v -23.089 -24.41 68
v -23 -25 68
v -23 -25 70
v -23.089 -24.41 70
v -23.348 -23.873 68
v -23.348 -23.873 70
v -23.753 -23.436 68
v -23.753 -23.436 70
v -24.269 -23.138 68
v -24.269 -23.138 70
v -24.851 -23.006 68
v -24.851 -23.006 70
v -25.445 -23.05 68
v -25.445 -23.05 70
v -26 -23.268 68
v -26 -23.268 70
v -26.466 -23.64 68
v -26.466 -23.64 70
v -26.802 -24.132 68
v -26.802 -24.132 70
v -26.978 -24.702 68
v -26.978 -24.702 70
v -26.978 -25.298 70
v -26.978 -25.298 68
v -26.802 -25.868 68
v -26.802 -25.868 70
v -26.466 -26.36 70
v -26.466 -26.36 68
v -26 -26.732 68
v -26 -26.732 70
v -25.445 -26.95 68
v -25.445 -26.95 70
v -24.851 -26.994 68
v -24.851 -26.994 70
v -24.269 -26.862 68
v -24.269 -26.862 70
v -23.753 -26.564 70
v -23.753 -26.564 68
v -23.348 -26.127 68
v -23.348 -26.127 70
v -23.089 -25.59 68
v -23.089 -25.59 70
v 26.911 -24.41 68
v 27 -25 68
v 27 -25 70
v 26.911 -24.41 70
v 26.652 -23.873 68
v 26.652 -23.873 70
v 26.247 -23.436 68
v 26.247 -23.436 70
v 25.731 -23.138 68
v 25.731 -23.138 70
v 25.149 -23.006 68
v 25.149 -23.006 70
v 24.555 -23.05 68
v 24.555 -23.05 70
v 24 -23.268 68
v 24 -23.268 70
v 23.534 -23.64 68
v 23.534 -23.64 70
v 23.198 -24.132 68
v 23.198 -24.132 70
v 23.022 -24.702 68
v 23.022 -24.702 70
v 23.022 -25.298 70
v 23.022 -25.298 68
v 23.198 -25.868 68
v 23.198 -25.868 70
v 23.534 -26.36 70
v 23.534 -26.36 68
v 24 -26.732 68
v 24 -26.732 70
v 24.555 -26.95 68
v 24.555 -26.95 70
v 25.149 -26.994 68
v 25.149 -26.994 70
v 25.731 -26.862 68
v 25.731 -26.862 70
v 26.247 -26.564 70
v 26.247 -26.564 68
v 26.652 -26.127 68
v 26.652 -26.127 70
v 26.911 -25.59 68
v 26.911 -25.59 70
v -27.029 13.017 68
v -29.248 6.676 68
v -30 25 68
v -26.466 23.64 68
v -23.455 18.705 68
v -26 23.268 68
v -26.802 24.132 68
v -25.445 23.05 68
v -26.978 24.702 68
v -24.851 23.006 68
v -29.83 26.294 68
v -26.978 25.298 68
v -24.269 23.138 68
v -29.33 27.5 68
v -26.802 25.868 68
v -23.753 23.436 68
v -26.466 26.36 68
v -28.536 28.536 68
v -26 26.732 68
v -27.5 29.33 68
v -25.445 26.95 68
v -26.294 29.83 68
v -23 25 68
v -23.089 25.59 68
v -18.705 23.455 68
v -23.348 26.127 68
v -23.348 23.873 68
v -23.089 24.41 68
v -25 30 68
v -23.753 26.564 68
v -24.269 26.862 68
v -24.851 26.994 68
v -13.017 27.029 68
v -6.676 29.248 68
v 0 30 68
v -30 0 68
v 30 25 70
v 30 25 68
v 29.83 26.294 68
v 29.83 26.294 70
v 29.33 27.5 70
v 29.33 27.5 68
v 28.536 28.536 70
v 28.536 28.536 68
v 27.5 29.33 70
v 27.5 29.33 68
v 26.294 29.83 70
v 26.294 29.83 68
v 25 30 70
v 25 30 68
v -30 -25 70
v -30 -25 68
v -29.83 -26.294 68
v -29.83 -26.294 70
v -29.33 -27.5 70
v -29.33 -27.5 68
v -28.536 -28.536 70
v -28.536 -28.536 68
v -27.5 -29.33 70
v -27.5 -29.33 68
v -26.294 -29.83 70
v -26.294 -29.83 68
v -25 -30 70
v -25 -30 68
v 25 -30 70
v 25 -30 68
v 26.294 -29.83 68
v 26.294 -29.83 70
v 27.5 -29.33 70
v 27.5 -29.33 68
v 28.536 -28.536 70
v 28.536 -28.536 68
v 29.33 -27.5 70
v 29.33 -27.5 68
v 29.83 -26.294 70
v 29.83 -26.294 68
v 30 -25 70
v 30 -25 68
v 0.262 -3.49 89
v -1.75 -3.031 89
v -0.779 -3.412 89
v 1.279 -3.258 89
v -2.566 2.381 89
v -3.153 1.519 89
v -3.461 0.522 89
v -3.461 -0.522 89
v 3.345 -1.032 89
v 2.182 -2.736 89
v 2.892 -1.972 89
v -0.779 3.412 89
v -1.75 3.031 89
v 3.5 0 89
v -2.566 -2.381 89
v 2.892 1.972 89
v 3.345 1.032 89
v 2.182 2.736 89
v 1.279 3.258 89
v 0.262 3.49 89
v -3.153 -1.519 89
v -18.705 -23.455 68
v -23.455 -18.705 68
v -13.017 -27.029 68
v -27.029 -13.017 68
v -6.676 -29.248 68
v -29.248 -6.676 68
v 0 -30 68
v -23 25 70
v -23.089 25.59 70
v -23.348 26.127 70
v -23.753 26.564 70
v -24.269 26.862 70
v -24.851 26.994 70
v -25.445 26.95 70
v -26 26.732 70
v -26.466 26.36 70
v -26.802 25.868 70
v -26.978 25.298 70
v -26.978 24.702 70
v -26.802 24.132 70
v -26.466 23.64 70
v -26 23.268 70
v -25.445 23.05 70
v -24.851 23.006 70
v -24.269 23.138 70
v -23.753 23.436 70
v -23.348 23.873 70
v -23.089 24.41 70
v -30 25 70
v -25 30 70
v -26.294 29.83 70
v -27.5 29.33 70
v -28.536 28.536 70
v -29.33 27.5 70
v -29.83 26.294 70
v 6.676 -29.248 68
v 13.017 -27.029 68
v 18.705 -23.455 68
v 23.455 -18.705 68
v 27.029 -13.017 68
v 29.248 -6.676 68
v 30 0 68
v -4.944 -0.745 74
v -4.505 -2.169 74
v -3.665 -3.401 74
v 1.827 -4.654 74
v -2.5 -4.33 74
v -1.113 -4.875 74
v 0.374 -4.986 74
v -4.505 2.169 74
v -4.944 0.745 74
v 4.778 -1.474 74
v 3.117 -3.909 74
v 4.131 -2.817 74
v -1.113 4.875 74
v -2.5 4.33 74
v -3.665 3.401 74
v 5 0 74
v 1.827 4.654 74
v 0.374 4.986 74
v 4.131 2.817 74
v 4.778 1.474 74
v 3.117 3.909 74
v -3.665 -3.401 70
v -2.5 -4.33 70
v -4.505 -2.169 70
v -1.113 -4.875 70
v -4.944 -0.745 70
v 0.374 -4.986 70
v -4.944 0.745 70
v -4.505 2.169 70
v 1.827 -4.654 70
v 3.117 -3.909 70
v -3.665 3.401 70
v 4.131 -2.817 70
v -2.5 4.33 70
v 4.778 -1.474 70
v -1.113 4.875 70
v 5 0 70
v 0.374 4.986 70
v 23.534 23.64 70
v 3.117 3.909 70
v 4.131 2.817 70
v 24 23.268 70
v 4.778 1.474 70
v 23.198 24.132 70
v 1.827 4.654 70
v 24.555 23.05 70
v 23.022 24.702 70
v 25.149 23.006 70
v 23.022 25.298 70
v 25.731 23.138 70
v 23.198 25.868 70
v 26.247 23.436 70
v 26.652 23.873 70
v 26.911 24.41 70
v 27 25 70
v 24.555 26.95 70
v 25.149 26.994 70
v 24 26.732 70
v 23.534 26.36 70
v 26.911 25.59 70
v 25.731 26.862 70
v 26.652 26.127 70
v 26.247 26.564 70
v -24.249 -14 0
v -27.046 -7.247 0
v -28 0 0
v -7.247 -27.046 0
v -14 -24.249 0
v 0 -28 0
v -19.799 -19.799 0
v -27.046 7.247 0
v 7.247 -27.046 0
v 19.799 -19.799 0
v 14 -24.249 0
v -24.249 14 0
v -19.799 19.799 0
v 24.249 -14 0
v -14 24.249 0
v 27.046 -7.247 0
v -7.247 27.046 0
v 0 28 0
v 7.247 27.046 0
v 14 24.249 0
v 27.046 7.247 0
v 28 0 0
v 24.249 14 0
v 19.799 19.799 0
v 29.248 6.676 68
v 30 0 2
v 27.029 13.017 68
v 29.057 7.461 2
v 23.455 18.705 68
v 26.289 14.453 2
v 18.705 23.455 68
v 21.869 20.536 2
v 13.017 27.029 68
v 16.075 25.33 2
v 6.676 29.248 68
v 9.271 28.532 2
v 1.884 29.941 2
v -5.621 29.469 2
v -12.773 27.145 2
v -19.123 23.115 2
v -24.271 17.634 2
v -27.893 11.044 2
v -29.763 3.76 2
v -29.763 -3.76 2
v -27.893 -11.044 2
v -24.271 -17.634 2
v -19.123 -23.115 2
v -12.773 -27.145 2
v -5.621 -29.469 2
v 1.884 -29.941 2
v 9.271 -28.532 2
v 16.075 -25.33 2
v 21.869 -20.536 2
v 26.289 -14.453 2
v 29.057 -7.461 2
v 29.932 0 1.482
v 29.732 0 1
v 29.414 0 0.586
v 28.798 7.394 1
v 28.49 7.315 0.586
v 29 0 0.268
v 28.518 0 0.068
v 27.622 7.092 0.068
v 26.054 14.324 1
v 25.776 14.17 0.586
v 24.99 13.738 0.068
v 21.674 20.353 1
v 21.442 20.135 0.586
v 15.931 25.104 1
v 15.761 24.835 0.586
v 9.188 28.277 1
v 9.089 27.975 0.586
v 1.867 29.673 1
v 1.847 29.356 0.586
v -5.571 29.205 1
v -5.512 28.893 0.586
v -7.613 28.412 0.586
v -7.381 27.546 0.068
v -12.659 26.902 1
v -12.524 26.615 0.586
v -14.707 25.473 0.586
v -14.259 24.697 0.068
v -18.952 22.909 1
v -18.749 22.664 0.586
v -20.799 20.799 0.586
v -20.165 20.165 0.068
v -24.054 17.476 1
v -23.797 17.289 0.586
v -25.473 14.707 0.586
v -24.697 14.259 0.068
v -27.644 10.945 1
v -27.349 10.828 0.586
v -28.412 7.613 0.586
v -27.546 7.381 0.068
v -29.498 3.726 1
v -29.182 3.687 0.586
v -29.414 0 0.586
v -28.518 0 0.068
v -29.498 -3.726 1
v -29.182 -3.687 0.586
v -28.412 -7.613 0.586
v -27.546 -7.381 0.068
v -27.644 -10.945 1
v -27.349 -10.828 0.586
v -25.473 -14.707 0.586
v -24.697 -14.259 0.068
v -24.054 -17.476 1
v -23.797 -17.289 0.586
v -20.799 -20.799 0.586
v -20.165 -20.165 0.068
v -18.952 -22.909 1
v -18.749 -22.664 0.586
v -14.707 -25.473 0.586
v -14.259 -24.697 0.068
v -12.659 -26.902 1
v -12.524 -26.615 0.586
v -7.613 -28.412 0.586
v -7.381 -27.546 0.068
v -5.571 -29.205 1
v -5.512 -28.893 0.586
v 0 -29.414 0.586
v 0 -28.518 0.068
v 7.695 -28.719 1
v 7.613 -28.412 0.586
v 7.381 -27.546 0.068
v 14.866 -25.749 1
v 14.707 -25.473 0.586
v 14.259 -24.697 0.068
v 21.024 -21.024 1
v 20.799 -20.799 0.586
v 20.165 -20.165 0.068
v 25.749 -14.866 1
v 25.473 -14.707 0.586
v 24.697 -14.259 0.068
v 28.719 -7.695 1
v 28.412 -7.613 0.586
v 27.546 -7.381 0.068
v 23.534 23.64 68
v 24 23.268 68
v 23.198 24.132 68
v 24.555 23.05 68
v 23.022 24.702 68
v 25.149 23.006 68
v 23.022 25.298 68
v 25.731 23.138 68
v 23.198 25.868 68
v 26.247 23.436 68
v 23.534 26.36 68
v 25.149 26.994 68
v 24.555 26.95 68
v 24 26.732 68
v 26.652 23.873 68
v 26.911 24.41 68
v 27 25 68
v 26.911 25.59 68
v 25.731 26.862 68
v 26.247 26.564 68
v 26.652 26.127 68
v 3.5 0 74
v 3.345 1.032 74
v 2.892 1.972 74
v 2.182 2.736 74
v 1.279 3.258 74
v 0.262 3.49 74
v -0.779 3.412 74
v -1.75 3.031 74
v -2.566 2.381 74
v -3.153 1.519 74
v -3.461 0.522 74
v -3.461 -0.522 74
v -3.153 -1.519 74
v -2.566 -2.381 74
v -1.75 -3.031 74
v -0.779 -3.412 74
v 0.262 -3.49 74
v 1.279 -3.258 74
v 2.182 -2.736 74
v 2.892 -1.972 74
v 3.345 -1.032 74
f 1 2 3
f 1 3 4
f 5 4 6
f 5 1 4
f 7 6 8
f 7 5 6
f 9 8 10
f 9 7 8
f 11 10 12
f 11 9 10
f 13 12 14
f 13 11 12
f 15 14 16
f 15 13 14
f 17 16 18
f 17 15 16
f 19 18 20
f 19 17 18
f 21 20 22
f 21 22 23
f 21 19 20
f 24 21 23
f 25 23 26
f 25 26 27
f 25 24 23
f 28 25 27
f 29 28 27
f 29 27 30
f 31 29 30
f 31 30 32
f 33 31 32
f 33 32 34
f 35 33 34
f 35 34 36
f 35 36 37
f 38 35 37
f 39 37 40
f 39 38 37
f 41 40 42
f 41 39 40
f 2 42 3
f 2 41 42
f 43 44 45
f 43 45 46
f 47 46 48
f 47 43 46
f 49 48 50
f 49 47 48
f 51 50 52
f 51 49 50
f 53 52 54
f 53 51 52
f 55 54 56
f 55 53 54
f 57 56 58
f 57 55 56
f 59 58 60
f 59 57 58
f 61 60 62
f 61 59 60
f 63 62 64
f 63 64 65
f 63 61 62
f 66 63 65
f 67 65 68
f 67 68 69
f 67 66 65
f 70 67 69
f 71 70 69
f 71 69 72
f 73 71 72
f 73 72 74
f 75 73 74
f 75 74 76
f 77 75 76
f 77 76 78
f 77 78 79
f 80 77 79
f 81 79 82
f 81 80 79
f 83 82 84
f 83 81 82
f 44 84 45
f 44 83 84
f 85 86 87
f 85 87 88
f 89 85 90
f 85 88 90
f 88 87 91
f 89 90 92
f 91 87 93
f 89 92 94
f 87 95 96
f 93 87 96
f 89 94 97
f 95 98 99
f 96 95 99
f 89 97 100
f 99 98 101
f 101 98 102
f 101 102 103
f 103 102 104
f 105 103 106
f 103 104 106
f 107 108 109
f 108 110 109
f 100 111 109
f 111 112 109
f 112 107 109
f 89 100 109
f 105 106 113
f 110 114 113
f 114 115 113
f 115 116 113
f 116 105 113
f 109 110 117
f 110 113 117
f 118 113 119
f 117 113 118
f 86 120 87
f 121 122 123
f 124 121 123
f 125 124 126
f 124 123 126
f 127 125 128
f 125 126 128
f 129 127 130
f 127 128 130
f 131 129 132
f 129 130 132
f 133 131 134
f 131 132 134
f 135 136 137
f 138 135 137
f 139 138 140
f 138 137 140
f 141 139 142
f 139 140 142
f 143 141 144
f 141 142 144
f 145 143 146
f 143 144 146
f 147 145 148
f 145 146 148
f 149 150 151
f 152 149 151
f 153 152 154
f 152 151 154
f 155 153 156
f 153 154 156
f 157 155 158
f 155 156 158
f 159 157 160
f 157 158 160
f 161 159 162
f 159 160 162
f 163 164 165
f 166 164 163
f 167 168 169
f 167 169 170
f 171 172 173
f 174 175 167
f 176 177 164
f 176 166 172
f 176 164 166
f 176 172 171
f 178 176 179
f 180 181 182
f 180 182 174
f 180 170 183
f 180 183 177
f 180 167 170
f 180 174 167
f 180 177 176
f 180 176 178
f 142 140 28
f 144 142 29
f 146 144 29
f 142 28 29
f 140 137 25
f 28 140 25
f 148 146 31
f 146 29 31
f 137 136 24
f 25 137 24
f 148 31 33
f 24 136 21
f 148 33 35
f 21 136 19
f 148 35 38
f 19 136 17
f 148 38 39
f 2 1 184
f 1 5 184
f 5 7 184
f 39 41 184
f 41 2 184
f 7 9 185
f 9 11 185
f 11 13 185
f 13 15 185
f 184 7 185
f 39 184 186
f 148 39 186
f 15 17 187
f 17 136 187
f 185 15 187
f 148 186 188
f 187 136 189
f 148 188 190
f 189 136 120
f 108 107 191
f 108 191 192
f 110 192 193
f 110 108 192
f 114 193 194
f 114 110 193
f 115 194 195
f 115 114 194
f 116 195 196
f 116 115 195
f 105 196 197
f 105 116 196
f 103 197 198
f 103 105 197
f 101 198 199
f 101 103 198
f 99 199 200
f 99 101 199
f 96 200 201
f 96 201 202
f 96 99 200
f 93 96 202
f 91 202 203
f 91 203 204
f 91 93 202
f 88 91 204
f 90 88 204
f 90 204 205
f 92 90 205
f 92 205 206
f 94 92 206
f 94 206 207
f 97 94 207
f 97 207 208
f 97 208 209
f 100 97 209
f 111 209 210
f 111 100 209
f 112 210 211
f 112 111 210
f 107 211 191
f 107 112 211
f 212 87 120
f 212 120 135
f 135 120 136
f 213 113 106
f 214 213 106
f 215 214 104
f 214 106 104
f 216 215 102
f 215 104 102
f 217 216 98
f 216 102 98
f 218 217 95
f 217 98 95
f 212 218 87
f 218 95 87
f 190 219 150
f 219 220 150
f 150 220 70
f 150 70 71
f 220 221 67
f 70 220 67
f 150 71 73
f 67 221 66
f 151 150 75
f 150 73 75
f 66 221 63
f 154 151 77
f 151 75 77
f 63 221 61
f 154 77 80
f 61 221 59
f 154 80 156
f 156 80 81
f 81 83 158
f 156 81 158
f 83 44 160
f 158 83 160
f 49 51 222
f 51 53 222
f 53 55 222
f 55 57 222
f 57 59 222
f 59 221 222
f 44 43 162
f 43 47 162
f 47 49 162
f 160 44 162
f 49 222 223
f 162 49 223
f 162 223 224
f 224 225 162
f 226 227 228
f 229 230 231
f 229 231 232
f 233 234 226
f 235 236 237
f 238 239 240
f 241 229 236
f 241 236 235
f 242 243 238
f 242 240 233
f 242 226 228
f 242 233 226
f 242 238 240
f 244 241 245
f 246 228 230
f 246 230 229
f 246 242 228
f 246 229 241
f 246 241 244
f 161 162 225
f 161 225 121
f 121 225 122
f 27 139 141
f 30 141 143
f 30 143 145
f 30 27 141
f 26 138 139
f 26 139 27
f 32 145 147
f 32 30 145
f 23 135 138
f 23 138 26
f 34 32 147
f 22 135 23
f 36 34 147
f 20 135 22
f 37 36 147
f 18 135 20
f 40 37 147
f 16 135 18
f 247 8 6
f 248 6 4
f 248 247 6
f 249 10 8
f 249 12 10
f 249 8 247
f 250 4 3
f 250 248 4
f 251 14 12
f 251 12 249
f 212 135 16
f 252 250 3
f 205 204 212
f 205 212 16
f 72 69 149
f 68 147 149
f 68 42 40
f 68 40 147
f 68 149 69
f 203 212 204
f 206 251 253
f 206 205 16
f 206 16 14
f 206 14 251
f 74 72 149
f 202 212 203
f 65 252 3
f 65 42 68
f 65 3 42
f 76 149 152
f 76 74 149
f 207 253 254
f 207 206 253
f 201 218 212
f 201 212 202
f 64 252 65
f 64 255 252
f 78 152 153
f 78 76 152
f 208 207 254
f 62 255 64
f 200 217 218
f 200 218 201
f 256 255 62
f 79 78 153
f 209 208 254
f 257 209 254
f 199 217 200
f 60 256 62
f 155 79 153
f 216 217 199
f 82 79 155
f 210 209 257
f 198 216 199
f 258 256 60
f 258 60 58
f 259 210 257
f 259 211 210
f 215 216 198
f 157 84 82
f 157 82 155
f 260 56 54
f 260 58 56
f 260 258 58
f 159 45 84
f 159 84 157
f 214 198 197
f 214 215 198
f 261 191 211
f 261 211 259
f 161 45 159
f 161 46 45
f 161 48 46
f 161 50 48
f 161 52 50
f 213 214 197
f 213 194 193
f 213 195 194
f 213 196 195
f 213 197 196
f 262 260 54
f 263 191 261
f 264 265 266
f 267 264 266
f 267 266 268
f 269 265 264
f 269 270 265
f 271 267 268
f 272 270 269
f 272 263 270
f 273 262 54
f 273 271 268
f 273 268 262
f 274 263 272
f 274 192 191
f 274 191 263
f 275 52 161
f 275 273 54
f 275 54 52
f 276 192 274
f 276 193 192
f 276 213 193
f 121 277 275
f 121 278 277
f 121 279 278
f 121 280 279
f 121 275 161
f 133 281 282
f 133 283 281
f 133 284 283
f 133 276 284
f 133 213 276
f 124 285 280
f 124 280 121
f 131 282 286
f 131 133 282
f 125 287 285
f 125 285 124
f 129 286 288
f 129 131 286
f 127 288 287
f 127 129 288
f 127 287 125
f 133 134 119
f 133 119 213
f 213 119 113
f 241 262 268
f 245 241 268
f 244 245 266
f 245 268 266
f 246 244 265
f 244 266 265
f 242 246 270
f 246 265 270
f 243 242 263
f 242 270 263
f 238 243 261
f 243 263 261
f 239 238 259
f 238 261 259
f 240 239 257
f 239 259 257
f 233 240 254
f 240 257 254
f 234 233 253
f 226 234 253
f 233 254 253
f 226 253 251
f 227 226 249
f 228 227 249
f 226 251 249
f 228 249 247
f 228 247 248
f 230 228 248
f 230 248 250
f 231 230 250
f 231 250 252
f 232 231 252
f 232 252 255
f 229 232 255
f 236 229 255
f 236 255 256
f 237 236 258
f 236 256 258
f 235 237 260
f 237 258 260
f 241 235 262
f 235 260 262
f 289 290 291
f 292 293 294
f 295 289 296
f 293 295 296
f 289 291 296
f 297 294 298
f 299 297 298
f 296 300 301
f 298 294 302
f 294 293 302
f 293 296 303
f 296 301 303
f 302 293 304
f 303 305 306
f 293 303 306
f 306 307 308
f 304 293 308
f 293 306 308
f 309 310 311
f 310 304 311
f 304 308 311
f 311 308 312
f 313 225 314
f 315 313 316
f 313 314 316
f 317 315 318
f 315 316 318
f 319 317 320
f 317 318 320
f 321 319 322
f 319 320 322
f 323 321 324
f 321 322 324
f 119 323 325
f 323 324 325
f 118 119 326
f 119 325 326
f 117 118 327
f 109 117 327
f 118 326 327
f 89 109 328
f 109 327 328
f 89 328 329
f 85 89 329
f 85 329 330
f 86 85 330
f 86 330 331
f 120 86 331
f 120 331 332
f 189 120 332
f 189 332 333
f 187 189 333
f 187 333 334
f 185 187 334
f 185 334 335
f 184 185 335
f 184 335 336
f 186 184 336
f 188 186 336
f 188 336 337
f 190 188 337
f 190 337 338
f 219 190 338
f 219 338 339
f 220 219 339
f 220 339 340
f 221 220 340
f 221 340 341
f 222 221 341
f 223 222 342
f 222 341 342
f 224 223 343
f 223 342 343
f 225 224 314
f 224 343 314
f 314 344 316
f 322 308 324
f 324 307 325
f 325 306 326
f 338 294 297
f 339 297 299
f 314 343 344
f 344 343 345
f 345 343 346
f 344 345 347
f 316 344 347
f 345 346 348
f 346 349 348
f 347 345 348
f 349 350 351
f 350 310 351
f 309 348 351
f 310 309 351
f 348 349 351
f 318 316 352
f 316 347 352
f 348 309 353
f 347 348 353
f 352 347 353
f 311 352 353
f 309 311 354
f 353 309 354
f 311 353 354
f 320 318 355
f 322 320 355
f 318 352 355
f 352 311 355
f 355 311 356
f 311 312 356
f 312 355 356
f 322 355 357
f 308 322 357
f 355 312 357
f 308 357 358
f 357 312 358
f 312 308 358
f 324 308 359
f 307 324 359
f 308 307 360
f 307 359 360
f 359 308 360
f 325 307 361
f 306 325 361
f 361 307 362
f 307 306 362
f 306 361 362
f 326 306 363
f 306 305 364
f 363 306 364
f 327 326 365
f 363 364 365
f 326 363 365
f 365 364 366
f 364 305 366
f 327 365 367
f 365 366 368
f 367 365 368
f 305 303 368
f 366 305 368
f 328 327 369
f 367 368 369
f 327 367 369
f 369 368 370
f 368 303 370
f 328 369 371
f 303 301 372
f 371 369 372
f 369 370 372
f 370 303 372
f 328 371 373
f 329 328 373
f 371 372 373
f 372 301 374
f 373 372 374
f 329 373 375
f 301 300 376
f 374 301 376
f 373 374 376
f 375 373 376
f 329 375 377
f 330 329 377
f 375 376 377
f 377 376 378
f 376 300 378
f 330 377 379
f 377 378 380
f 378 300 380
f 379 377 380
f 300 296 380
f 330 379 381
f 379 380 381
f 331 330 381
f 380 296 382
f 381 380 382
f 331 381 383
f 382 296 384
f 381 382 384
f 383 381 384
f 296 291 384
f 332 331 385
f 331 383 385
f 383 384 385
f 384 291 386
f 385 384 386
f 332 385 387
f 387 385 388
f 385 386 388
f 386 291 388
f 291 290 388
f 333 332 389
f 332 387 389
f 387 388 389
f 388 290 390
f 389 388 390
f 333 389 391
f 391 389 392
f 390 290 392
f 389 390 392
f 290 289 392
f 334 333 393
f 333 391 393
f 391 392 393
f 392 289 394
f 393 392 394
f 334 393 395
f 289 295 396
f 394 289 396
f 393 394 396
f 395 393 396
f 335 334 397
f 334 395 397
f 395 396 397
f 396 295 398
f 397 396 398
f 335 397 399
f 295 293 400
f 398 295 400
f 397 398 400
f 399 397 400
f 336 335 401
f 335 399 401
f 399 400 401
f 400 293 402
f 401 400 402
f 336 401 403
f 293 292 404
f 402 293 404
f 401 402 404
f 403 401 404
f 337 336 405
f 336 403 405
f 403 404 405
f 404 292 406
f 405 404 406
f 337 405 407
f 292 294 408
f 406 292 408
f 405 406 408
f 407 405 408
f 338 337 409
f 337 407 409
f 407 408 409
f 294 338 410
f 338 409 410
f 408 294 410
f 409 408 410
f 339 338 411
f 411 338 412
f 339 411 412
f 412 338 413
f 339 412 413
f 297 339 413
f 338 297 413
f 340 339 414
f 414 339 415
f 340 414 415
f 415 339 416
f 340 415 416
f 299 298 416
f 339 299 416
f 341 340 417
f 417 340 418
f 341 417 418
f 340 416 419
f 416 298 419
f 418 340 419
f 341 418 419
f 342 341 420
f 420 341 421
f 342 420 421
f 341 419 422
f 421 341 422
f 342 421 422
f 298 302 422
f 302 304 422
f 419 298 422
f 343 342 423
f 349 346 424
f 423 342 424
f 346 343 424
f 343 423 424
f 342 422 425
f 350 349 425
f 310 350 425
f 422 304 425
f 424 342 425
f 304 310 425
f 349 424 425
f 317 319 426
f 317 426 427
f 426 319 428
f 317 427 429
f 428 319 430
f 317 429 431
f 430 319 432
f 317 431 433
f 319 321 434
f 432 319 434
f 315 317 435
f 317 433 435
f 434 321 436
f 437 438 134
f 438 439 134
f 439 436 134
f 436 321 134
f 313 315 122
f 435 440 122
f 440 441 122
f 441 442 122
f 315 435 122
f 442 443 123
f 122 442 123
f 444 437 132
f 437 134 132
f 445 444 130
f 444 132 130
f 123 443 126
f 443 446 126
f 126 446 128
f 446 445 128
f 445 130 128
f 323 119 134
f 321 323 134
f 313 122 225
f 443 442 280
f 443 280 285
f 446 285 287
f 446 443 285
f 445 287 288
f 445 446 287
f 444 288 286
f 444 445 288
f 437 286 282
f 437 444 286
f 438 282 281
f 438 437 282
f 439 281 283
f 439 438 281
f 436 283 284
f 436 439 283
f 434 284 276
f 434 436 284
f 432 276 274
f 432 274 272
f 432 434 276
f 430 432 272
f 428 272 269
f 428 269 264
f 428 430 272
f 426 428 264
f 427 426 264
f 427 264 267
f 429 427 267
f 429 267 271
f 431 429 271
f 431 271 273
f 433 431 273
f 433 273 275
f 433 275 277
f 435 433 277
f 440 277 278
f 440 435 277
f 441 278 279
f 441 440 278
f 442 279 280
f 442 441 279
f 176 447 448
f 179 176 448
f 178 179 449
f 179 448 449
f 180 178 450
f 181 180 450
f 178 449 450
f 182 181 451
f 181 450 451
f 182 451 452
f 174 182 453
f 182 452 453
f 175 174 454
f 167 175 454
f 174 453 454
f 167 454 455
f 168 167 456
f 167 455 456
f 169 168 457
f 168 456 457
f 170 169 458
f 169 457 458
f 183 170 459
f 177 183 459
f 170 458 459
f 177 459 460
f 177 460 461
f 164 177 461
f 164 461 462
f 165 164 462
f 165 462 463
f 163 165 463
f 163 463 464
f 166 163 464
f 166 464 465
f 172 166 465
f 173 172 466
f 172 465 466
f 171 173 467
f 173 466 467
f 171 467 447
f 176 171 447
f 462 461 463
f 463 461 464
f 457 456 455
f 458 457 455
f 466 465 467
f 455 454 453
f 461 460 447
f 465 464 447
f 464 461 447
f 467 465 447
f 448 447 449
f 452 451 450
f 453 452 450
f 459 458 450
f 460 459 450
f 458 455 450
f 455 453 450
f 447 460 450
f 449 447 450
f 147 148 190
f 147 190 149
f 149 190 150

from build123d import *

# Parameters (mm, degrees)
SKETCH1_R           = 30
BOSS_EXTRUDE1_DEPTH = 68
SKETCH2_R           = 2
BOSS_EXTRUDE2_DEPTH = 2
FILLET1_R           = 2
SKETCH3_R           = 5
BOSS_EXTRUDE3_DEPTH = 4
SKETCH4_R           = 3.5
BOSS_EXTRUDE4_DEPTH = 15


with BuildPart() as part:
    # Sketch1 → Boss-Extrude1 (new body)
    with BuildSketch(Plane.XY):
        Circle(SKETCH1_R)
    extrude(amount=BOSS_EXTRUDE1_DEPTH)

    # Sketch2 → Boss-Extrude2 (add)
    with BuildSketch(Plane.XY.offset(68)):
        with BuildLine():
            Line((25, 30), (-25, 30))
            ThreePointArc((-25, 30), (-28.535533906, 28.535533906), (-30, 25))
            Line((-30, 25), (-30, -25))
            ThreePointArc((-30, -25), (-28.535533906, -28.535533906), (-25, -30))
            Line((-25, -30), (25, -30))
            ThreePointArc((25, -30), (28.535533906, -28.535533906), (30, -25))
            Line((30, -25), (30, 25))
            ThreePointArc((30, 25), (28.535533906, 28.535533906), (25, 30))
        make_face()
        with Locations((-25, 25)):
            Circle(SKETCH2_R, mode=Mode.SUBTRACT)
        with Locations((25, 25)):
            Circle(SKETCH2_R, mode=Mode.SUBTRACT)
        with Locations((25, -25)):
            Circle(SKETCH2_R, mode=Mode.SUBTRACT)
        with Locations((-25, -25)):
            Circle(SKETCH2_R, mode=Mode.SUBTRACT)
    extrude(amount=BOSS_EXTRUDE2_DEPTH)

    # Fillet1
    fillet1_edges = [part.edges().sort_by_distance(p)[0] for p in [
        (-30, 0, 0),
    ]]
    fillet(fillet1_edges, radius=FILLET1_R)

    # Sketch3 → Boss-Extrude3 (add)
    with BuildSketch(Plane.XY.offset(70)):
        Circle(SKETCH3_R)
    extrude(amount=BOSS_EXTRUDE3_DEPTH)


with BuildPart() as body_2:
    # Sketch4 → Boss-Extrude4 (new body)
    with BuildSketch(Plane.XY.offset(74)):
        Circle(SKETCH4_R)
    extrude(amount=BOSS_EXTRUDE4_DEPTH)


solid = Compound([part.part, body_2.part])
